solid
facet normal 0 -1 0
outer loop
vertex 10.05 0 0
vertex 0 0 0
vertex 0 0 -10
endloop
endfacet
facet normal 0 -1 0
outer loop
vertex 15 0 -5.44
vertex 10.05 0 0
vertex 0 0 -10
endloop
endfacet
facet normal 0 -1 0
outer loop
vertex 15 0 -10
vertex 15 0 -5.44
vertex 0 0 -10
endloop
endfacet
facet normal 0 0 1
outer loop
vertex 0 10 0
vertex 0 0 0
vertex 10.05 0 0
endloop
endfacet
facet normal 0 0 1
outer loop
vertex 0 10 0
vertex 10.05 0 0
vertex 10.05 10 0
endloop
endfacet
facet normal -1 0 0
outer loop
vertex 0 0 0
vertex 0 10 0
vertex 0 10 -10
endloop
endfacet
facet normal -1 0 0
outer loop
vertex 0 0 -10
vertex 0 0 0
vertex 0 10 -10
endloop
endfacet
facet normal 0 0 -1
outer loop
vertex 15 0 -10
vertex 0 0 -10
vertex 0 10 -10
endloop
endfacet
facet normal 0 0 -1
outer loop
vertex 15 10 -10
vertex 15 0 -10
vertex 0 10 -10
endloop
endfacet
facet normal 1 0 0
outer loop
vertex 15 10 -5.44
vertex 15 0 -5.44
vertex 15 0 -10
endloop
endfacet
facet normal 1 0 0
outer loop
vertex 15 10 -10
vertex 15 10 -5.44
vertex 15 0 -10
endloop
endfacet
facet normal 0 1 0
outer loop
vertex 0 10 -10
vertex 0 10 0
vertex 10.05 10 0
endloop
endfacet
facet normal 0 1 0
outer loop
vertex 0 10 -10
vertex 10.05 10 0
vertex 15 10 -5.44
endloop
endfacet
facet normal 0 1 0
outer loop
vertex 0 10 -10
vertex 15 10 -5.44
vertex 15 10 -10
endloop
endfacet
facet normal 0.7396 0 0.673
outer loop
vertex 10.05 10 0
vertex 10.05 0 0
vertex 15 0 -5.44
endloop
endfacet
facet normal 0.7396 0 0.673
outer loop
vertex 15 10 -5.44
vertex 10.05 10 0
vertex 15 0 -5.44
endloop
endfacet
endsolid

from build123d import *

# Parameters (mm, degrees)
SKETCH_1_W          = 10
SKETCH_1_H          = 10
EXTRUDE_1_DEPTH     = 15
CUT_EXTRUDE_1_DEPTH = 15


with BuildPart() as part:
    # Эскиз1 → Бобышка-Вытянуть1 (new body)
    with BuildSketch(Plane(origin=(0, 0, 0), x_dir=(0, 0, -1), z_dir=(1, 0, 0))):
        with Locations((5, 5)):
            Rectangle(SKETCH_1_W, SKETCH_1_H)
    extrude(amount=EXTRUDE_1_DEPTH)

    # Эскиз2 → Вырез-Вытянуть1 (cut)
    with BuildSketch(Plane(origin=(0, 10, 0), x_dir=(1, 0, 0), z_dir=(0, 1, 0))):
        Polygon((10.050486539, 0), (15, 5.440128208), (15, 0), align=None)
    extrude(amount=-CUT_EXTRUDE_1_DEPTH, mode=Mode.SUBTRACT)


solid = part.part
